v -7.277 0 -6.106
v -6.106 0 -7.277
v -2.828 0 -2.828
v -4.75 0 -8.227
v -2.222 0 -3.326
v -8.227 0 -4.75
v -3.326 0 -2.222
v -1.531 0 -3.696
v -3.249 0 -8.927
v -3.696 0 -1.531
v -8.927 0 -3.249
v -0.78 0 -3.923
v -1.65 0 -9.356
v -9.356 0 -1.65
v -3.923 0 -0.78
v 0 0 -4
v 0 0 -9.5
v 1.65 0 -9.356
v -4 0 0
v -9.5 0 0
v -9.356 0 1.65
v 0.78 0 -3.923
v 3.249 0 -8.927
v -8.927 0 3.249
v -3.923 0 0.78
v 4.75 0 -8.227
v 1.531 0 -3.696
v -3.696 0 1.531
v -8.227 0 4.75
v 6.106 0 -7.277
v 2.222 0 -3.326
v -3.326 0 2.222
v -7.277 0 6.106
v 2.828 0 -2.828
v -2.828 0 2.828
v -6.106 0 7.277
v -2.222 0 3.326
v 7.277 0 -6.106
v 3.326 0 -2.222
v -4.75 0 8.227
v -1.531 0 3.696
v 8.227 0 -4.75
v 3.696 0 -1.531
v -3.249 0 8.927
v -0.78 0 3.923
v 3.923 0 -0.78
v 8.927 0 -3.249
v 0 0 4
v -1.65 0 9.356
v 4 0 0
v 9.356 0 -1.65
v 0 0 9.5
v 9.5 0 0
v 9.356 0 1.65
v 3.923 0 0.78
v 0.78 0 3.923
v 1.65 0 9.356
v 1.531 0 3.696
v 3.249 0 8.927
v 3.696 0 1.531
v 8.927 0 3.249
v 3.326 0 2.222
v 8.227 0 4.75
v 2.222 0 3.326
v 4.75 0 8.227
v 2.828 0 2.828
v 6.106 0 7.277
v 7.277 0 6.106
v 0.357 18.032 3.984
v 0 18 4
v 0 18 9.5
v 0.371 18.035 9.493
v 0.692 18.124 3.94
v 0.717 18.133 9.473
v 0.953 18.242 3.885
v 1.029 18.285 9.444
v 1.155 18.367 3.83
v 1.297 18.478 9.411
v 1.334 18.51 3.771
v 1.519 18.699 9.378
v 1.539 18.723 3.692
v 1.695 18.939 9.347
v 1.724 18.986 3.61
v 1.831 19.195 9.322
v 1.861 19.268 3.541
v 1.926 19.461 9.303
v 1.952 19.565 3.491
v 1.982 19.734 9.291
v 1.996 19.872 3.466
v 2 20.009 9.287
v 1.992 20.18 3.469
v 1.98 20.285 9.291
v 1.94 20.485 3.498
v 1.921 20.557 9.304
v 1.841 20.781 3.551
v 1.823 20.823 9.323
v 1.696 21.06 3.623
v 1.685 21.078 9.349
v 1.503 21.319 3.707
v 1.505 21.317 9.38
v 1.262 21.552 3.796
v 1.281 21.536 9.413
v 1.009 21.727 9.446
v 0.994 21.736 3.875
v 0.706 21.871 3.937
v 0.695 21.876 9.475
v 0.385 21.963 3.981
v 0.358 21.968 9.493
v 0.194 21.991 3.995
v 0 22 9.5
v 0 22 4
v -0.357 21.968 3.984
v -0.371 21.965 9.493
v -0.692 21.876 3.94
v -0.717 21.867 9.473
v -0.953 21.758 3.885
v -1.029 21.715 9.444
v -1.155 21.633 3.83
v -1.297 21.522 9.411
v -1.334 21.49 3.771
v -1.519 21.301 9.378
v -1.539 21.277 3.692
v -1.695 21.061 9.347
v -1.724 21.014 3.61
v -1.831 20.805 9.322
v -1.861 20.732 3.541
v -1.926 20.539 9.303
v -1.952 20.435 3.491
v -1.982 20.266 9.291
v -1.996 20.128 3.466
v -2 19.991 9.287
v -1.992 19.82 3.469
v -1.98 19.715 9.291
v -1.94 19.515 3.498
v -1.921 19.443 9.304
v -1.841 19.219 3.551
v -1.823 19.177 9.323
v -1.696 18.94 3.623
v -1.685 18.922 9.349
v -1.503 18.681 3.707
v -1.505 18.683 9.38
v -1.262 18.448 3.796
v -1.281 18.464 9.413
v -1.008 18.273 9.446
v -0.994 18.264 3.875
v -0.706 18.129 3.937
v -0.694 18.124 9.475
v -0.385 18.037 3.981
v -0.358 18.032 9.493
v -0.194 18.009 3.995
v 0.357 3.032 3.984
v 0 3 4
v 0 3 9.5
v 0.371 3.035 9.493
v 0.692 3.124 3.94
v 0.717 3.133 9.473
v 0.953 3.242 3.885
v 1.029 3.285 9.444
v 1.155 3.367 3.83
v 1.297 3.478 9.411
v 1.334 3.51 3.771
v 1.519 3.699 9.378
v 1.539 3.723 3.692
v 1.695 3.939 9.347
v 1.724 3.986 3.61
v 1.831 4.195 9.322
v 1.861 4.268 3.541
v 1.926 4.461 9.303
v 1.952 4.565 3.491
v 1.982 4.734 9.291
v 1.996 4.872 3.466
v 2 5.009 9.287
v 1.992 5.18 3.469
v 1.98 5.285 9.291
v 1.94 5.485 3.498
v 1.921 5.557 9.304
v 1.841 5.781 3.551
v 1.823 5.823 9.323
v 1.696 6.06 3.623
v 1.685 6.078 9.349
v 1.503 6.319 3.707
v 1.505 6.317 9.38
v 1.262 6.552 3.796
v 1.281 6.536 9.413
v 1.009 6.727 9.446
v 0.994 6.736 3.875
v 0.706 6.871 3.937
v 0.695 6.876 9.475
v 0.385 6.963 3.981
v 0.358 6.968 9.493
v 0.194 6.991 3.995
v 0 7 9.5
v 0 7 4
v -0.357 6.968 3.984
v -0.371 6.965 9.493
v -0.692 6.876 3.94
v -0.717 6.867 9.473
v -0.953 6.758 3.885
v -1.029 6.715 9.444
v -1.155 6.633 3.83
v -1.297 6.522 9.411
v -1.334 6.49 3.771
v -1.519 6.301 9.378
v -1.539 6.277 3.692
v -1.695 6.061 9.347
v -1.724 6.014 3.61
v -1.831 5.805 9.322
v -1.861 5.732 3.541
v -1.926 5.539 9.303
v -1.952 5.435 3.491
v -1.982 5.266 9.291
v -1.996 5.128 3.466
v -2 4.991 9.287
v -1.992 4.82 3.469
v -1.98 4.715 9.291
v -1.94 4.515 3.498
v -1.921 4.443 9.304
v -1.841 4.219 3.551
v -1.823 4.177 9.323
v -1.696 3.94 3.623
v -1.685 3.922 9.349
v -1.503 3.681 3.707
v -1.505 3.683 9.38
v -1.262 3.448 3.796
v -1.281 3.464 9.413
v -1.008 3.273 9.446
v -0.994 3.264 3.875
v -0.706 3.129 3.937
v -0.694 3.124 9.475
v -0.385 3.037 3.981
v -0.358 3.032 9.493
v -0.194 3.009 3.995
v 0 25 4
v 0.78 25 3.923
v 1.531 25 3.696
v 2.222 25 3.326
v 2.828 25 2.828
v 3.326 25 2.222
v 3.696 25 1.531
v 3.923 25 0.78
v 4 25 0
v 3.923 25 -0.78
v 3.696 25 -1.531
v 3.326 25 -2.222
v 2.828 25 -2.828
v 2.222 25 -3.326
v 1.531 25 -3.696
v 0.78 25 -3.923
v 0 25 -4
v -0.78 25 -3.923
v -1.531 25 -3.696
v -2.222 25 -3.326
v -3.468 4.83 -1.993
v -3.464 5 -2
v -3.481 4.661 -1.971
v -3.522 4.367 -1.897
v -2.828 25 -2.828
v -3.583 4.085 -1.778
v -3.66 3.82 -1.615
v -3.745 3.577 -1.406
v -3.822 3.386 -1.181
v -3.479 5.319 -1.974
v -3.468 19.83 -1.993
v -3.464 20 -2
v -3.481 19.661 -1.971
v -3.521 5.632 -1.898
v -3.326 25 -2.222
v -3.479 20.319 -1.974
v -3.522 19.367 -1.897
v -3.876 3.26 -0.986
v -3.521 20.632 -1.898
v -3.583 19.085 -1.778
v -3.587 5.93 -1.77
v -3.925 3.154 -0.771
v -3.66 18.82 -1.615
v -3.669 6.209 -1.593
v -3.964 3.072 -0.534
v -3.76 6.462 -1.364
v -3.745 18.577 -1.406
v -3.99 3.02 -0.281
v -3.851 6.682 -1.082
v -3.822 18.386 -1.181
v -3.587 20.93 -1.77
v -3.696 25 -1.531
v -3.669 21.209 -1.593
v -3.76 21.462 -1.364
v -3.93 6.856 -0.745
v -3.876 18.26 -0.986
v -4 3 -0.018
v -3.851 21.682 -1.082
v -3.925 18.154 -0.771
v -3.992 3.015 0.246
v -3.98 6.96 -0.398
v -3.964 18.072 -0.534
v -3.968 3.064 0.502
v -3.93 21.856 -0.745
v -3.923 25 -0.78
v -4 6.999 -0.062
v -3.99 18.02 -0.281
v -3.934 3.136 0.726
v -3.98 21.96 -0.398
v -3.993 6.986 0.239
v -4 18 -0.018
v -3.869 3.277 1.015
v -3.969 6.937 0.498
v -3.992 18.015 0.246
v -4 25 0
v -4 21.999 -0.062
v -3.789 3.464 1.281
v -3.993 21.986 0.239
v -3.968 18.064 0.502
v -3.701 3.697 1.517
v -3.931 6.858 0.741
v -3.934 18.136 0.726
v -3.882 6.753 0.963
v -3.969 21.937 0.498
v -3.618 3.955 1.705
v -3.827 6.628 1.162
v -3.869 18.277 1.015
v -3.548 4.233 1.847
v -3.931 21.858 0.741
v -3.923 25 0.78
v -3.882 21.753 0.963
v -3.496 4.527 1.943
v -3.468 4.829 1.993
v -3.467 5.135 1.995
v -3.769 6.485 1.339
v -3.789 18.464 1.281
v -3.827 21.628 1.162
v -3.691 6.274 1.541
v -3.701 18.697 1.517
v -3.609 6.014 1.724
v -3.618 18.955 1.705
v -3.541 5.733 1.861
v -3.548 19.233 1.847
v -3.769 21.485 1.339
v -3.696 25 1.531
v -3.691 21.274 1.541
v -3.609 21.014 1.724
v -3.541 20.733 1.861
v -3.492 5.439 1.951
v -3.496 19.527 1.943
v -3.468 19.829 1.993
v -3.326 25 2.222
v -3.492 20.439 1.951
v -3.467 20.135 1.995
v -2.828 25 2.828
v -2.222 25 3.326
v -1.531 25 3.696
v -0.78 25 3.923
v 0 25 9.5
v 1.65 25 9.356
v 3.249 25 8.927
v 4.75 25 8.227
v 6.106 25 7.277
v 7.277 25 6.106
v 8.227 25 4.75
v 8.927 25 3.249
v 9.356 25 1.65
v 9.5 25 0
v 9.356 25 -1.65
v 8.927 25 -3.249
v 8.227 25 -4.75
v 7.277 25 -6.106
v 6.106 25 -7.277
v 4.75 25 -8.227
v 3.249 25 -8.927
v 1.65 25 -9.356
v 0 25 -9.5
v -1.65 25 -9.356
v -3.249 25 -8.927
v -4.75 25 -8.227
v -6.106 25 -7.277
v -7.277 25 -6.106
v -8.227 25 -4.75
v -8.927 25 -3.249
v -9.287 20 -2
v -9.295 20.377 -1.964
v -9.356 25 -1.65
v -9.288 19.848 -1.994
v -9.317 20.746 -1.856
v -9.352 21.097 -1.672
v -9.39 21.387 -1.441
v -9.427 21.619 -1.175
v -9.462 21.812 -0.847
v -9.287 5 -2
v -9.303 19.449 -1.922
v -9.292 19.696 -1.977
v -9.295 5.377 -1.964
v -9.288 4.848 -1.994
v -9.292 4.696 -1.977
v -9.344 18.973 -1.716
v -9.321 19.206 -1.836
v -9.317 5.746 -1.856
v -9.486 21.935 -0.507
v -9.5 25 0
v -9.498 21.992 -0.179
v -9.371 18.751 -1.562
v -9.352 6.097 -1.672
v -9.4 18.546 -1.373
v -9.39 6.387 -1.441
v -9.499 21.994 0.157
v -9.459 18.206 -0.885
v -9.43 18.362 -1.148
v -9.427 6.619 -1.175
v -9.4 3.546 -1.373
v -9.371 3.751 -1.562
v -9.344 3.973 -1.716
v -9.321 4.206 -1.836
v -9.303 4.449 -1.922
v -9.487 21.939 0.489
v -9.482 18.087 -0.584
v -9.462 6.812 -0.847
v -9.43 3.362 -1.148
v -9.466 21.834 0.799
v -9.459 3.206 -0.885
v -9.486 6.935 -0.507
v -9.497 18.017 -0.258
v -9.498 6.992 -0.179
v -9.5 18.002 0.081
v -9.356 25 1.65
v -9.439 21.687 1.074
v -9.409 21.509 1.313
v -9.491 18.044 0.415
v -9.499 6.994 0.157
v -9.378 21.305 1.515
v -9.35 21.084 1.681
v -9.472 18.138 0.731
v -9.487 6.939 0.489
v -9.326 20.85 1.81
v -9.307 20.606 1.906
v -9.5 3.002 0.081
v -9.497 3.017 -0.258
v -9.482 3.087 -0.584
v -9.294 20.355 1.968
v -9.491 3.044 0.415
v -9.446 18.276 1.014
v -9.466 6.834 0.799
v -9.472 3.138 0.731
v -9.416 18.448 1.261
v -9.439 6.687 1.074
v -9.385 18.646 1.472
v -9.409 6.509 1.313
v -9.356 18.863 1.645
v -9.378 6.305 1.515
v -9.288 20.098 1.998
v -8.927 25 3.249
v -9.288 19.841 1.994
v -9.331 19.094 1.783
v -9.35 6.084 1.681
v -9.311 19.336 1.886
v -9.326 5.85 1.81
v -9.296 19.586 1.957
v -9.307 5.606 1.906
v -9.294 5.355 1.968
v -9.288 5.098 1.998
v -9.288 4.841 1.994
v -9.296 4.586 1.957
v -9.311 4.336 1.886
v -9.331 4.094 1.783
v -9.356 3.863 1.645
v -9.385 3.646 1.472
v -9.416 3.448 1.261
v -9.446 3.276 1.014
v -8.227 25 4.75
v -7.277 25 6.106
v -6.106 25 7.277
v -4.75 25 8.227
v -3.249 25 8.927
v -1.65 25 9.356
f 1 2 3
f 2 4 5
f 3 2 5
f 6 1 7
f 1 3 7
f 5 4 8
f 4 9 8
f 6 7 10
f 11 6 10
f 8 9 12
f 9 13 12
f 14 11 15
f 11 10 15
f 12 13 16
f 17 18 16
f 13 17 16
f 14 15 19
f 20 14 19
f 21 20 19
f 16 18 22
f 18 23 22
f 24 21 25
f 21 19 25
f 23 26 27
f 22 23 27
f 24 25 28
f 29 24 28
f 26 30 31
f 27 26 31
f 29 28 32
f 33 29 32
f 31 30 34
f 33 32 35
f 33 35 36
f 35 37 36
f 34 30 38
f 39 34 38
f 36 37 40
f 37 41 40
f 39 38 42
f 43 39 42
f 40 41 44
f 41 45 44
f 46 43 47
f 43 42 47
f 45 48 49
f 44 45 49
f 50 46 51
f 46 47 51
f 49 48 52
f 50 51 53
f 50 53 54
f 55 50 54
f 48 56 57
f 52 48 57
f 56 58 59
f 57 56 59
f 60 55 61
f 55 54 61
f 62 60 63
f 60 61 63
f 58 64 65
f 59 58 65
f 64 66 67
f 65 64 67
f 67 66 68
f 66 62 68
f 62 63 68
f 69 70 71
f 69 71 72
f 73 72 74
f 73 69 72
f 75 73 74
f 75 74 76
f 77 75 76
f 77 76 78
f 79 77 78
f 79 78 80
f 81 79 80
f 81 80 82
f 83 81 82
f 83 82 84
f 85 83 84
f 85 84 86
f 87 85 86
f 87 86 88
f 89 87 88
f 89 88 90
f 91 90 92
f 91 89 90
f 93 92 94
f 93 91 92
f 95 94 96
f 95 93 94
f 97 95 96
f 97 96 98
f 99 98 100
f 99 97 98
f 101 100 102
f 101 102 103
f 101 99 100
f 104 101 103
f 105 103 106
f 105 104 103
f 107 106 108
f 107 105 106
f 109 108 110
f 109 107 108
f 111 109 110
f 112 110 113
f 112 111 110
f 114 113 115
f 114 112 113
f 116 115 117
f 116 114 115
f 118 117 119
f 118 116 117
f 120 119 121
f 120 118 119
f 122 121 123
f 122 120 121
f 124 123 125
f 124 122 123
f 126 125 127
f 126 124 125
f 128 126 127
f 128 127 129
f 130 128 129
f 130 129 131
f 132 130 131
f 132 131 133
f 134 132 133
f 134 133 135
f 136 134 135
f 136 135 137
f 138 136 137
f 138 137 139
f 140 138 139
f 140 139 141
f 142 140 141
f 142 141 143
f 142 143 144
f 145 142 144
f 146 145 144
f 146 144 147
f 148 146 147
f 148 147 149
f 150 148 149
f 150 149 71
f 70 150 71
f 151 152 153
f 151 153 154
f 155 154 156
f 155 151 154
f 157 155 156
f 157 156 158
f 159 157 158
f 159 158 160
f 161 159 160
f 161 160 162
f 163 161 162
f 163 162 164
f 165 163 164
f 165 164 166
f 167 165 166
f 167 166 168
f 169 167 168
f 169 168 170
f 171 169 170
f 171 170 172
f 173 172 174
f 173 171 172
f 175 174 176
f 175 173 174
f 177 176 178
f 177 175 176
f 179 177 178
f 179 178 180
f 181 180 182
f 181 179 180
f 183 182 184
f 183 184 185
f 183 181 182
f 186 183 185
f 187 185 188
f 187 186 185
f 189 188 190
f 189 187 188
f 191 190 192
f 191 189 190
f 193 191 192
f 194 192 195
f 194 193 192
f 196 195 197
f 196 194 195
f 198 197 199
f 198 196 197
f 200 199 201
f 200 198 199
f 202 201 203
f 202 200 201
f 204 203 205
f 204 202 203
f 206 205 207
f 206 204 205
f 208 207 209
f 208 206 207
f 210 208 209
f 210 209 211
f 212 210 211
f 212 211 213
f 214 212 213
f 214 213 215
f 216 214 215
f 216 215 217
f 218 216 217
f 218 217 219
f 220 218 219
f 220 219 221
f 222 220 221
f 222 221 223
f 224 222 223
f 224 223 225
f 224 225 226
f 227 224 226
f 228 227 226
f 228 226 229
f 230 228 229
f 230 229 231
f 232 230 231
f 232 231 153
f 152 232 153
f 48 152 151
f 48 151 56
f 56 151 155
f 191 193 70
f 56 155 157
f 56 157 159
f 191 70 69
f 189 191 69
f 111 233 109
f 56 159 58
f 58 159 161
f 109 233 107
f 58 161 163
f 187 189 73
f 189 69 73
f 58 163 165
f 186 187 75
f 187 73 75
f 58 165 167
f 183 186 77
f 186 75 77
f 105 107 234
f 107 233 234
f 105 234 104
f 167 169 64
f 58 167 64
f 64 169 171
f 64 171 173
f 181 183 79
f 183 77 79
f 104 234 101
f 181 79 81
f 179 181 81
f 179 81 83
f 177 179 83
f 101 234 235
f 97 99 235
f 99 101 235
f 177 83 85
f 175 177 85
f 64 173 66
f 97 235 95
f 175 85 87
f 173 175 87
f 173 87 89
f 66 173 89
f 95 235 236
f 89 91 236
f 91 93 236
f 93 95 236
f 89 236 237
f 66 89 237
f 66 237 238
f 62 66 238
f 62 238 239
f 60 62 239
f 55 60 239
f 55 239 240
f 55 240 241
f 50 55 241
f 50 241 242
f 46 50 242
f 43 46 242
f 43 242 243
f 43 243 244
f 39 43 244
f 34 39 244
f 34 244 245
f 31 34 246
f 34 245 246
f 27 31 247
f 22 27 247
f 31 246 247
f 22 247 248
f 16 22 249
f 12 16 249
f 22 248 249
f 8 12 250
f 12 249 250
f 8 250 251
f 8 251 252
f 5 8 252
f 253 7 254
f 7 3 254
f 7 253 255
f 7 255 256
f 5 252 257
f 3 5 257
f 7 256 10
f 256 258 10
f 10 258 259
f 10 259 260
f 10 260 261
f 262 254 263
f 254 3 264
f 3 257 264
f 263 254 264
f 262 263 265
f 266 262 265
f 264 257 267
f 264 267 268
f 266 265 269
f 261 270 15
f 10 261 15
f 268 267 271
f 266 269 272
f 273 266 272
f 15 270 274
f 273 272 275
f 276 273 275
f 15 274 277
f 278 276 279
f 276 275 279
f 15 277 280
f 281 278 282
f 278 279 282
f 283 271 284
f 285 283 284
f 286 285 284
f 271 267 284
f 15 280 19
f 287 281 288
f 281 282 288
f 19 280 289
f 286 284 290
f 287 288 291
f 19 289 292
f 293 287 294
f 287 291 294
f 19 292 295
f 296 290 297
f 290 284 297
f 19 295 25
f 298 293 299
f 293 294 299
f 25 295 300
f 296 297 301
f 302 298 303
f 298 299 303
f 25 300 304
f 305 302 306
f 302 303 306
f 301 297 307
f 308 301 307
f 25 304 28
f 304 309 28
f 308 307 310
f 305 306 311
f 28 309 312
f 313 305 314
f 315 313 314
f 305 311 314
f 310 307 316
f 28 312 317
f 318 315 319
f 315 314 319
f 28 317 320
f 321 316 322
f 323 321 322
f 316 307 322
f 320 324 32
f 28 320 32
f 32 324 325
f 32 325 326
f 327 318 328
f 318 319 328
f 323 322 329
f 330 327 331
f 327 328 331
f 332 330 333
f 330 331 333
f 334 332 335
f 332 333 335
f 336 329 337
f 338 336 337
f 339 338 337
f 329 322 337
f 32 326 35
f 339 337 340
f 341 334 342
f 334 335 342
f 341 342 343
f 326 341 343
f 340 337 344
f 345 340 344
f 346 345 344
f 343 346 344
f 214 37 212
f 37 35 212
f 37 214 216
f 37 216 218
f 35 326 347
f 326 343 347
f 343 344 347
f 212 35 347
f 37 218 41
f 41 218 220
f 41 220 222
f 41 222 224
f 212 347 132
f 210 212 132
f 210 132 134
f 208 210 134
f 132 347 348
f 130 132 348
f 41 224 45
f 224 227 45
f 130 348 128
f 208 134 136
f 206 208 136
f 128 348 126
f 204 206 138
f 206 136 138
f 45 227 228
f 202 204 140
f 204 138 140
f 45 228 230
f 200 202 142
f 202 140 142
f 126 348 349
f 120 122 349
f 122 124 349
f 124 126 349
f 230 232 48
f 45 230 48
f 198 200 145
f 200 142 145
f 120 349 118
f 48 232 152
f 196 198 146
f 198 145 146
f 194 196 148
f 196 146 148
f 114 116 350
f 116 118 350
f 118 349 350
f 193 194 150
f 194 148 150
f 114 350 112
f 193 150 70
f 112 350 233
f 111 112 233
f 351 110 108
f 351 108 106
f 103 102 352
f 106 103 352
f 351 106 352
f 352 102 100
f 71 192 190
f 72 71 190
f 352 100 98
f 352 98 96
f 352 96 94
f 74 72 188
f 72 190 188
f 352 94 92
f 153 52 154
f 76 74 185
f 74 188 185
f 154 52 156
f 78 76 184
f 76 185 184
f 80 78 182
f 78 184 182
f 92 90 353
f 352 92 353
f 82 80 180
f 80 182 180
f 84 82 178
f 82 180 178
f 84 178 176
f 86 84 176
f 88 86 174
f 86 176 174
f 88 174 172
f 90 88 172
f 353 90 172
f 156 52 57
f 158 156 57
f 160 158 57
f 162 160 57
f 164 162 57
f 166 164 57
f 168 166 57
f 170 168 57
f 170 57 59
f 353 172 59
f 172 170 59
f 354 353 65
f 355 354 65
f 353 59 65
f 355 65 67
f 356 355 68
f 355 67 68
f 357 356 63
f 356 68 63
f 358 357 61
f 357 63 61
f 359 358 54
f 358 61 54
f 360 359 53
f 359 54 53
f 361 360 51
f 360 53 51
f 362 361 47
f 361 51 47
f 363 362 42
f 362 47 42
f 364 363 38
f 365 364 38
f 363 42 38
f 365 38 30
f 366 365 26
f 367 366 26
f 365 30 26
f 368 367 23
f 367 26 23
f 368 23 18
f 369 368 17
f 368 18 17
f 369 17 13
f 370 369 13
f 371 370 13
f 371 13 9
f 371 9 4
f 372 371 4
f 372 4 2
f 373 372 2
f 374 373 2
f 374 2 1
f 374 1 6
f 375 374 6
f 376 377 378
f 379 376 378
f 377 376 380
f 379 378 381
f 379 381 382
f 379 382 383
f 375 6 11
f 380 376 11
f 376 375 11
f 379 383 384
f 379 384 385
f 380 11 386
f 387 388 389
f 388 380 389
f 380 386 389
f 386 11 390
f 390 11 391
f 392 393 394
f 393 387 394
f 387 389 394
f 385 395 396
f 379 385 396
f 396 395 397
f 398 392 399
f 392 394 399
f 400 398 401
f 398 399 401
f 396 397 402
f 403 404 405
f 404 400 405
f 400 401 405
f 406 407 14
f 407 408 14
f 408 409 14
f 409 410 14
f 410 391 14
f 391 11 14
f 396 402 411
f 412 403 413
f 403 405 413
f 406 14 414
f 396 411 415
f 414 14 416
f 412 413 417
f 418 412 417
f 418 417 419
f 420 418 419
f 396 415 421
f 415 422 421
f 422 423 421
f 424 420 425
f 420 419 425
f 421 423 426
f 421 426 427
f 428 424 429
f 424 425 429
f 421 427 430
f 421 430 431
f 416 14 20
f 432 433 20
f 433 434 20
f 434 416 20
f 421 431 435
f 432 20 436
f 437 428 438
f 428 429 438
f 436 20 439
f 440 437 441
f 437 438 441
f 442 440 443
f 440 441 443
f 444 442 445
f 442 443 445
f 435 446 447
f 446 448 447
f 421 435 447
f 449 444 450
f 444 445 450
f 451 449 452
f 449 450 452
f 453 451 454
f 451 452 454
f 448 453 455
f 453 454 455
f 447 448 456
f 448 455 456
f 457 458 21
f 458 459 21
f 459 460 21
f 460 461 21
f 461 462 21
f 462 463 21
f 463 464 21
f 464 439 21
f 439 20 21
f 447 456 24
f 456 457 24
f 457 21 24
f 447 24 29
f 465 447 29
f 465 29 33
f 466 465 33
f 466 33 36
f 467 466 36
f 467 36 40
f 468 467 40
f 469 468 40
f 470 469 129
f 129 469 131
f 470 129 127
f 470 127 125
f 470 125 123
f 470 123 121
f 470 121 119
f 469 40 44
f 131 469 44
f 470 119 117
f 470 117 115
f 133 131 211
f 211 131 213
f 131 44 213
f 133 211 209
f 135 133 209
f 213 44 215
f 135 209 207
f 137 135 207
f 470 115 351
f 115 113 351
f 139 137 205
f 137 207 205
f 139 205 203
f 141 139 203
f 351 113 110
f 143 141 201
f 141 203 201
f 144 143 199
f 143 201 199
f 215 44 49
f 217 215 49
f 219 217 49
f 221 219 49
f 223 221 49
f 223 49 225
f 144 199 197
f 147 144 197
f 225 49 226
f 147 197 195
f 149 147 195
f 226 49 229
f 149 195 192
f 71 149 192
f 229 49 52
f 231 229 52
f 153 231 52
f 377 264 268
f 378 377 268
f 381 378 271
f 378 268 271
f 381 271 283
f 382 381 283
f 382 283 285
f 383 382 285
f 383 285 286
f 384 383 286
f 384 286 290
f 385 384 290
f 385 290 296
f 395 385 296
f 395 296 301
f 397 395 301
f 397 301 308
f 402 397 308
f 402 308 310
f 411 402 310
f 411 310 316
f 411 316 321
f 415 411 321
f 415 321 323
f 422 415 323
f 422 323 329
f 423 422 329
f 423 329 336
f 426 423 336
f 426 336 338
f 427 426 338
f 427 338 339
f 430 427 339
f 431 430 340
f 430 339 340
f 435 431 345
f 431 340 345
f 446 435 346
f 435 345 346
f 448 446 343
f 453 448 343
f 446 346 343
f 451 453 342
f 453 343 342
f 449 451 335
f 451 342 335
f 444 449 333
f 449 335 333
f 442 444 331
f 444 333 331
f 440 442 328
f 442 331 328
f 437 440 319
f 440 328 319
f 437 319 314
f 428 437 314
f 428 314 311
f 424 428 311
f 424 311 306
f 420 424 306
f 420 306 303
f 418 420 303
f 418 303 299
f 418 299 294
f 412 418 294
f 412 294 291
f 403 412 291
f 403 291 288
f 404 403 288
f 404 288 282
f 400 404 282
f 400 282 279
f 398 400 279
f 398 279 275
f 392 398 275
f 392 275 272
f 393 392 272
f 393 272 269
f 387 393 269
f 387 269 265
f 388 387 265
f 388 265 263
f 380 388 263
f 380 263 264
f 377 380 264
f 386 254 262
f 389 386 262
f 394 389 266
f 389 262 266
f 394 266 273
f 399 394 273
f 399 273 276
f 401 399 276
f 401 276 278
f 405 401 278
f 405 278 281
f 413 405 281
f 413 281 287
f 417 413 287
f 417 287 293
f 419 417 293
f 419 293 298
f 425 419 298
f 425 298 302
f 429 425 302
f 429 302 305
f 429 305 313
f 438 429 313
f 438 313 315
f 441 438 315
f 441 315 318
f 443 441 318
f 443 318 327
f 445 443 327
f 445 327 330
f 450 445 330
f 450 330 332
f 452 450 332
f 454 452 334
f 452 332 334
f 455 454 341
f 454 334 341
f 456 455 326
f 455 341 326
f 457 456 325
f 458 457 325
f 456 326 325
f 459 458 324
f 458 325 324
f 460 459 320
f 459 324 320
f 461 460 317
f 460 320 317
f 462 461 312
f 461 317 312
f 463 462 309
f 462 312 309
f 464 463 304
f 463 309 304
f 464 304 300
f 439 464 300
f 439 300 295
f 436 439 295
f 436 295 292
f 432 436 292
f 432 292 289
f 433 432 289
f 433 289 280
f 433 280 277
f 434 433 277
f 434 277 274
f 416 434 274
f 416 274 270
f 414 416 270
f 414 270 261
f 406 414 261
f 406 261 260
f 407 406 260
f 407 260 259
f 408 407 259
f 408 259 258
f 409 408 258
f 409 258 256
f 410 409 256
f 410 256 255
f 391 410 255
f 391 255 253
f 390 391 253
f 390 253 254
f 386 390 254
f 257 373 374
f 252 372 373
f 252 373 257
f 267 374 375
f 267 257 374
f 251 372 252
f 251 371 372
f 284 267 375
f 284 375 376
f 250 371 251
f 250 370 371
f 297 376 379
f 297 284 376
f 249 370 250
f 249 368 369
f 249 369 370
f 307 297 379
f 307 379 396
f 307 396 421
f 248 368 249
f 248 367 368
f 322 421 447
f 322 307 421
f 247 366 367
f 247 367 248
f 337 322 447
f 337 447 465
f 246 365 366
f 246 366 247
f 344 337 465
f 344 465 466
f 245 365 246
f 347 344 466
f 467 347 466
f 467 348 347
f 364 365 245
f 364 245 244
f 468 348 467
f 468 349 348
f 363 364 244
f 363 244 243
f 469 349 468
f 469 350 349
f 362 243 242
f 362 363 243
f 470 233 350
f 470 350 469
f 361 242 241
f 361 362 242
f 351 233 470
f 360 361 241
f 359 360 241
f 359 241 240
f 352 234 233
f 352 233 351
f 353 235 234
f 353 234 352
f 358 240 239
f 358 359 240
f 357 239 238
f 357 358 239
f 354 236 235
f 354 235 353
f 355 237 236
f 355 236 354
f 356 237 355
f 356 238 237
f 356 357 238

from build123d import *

# Parameters (mm, degrees)
SKETCH1_R           = 9.5
BOSS_EXTRUDE1_DEPTH = 25
SKETCH2_R           = 4
CUT_EXTRUDE1_DEPTH  = 25
SKETCH3_R           = 2
CUT_EXTRUDE2_DEPTH  = 10
SKETCH4_R           = 2
CUT_EXTRUDE3_DEPTH  = 10


with BuildPart() as part:
    # Sketch1 → Boss-Extrude1 (new body)
    with BuildSketch(Plane(origin=(0, 0, 0), x_dir=(1, 0, 0), z_dir=(0, 1, 0))):
        with Locations(Location((0, 0, 0), (0, 0, 270))):
            Circle(SKETCH1_R)
    extrude(amount=BOSS_EXTRUDE1_DEPTH)

    # Sketch2 → Cut-Extrude1 (cut)
    with BuildSketch(Plane(origin=(0, 25, 0), x_dir=(1, 0, 0), z_dir=(0, 1, 0))):
        with Locations(Location((0, 0, 0), (0, 0, 270))):
            Circle(SKETCH2_R)
    extrude(amount=-CUT_EXTRUDE1_DEPTH, mode=Mode.SUBTRACT)

    # Sketch3 → Cut-Extrude2 (cut)
    with BuildSketch(Plane.XY):
        with Locations(Location((0, 20, 0), (0, 0, 270))):
            Circle(SKETCH3_R)
        with Locations(Location((0, 5, 0), (0, 0, 270))):
            Circle(SKETCH3_R)
    extrude(amount=CUT_EXTRUDE2_DEPTH, mode=Mode.SUBTRACT)

    # Sketch4 → Cut-Extrude3 (cut)
    with BuildSketch(Plane(origin=(0, 0, 0), x_dir=(0, 0, -1), z_dir=(1, 0, 0))):
        with Locations((0, 20)):
            Circle(SKETCH4_R)
        with Locations((0, 5)):
            Circle(SKETCH4_R)
    extrude(amount=-CUT_EXTRUDE3_DEPTH, mode=Mode.SUBTRACT)


solid = part.part
